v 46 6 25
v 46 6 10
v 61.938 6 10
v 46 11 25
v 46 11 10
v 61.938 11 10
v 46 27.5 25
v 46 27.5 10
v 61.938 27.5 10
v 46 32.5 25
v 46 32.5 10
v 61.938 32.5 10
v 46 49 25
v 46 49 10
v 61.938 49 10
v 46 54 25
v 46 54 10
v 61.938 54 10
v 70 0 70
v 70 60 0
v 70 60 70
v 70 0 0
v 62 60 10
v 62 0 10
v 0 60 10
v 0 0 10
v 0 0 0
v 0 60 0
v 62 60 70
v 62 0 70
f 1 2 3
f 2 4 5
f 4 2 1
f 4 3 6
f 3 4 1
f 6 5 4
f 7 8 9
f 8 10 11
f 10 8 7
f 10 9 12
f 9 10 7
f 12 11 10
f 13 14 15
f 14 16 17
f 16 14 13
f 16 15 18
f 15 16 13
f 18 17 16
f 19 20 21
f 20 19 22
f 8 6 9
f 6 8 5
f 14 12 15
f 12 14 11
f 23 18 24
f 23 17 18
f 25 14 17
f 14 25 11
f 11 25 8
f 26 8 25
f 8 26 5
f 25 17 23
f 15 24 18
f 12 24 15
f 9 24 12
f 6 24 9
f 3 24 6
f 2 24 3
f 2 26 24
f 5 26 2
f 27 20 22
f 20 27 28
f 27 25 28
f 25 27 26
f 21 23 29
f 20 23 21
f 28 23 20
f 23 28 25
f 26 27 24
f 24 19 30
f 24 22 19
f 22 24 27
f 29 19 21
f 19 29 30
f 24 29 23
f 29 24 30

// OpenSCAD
$fn = 32;

// ----------------------------------------------------------------------
// Rib bracket: 3-gusset L bracket
// ----------------------------------------------------------------------

// --- parameters (mm) ---
base_l = 70;              // foot length, X
base_w = 60;              // foot width, Y
base_t = 10;              // foot thickness
plate_t = 8;              // upright plate thickness
plate_h = 70;             // overall height
gus_l = 16;               // gusset leg along the foot
gus_h = 16;               // gusset height
gus_t = 5;                // gusset thickness
gus_edge = 6;             // gusset margin from the foot edge
n_gus = 3;                // gusset count

gus_pitch = (base_w - 2 * gus_edge - gus_t) / (n_gus - 1);  // gusset pitch

union() {
  cube([base_l, base_w, base_t]);
  translate([base_l - plate_t, 0, base_t - 1])
    cube([plate_t, base_w, plate_h - base_t + 1]);
  for (i = [0 : n_gus - 1])
    translate([base_l - plate_t - gus_l, gus_edge + i * gus_pitch, base_t - 1])
      rotate([-90, 0, 0])
        linear_extrude(height = gus_t)
          polygon(points = [[0, 0], [gus_l + 1, 0], [0, -gus_h]]);
}
